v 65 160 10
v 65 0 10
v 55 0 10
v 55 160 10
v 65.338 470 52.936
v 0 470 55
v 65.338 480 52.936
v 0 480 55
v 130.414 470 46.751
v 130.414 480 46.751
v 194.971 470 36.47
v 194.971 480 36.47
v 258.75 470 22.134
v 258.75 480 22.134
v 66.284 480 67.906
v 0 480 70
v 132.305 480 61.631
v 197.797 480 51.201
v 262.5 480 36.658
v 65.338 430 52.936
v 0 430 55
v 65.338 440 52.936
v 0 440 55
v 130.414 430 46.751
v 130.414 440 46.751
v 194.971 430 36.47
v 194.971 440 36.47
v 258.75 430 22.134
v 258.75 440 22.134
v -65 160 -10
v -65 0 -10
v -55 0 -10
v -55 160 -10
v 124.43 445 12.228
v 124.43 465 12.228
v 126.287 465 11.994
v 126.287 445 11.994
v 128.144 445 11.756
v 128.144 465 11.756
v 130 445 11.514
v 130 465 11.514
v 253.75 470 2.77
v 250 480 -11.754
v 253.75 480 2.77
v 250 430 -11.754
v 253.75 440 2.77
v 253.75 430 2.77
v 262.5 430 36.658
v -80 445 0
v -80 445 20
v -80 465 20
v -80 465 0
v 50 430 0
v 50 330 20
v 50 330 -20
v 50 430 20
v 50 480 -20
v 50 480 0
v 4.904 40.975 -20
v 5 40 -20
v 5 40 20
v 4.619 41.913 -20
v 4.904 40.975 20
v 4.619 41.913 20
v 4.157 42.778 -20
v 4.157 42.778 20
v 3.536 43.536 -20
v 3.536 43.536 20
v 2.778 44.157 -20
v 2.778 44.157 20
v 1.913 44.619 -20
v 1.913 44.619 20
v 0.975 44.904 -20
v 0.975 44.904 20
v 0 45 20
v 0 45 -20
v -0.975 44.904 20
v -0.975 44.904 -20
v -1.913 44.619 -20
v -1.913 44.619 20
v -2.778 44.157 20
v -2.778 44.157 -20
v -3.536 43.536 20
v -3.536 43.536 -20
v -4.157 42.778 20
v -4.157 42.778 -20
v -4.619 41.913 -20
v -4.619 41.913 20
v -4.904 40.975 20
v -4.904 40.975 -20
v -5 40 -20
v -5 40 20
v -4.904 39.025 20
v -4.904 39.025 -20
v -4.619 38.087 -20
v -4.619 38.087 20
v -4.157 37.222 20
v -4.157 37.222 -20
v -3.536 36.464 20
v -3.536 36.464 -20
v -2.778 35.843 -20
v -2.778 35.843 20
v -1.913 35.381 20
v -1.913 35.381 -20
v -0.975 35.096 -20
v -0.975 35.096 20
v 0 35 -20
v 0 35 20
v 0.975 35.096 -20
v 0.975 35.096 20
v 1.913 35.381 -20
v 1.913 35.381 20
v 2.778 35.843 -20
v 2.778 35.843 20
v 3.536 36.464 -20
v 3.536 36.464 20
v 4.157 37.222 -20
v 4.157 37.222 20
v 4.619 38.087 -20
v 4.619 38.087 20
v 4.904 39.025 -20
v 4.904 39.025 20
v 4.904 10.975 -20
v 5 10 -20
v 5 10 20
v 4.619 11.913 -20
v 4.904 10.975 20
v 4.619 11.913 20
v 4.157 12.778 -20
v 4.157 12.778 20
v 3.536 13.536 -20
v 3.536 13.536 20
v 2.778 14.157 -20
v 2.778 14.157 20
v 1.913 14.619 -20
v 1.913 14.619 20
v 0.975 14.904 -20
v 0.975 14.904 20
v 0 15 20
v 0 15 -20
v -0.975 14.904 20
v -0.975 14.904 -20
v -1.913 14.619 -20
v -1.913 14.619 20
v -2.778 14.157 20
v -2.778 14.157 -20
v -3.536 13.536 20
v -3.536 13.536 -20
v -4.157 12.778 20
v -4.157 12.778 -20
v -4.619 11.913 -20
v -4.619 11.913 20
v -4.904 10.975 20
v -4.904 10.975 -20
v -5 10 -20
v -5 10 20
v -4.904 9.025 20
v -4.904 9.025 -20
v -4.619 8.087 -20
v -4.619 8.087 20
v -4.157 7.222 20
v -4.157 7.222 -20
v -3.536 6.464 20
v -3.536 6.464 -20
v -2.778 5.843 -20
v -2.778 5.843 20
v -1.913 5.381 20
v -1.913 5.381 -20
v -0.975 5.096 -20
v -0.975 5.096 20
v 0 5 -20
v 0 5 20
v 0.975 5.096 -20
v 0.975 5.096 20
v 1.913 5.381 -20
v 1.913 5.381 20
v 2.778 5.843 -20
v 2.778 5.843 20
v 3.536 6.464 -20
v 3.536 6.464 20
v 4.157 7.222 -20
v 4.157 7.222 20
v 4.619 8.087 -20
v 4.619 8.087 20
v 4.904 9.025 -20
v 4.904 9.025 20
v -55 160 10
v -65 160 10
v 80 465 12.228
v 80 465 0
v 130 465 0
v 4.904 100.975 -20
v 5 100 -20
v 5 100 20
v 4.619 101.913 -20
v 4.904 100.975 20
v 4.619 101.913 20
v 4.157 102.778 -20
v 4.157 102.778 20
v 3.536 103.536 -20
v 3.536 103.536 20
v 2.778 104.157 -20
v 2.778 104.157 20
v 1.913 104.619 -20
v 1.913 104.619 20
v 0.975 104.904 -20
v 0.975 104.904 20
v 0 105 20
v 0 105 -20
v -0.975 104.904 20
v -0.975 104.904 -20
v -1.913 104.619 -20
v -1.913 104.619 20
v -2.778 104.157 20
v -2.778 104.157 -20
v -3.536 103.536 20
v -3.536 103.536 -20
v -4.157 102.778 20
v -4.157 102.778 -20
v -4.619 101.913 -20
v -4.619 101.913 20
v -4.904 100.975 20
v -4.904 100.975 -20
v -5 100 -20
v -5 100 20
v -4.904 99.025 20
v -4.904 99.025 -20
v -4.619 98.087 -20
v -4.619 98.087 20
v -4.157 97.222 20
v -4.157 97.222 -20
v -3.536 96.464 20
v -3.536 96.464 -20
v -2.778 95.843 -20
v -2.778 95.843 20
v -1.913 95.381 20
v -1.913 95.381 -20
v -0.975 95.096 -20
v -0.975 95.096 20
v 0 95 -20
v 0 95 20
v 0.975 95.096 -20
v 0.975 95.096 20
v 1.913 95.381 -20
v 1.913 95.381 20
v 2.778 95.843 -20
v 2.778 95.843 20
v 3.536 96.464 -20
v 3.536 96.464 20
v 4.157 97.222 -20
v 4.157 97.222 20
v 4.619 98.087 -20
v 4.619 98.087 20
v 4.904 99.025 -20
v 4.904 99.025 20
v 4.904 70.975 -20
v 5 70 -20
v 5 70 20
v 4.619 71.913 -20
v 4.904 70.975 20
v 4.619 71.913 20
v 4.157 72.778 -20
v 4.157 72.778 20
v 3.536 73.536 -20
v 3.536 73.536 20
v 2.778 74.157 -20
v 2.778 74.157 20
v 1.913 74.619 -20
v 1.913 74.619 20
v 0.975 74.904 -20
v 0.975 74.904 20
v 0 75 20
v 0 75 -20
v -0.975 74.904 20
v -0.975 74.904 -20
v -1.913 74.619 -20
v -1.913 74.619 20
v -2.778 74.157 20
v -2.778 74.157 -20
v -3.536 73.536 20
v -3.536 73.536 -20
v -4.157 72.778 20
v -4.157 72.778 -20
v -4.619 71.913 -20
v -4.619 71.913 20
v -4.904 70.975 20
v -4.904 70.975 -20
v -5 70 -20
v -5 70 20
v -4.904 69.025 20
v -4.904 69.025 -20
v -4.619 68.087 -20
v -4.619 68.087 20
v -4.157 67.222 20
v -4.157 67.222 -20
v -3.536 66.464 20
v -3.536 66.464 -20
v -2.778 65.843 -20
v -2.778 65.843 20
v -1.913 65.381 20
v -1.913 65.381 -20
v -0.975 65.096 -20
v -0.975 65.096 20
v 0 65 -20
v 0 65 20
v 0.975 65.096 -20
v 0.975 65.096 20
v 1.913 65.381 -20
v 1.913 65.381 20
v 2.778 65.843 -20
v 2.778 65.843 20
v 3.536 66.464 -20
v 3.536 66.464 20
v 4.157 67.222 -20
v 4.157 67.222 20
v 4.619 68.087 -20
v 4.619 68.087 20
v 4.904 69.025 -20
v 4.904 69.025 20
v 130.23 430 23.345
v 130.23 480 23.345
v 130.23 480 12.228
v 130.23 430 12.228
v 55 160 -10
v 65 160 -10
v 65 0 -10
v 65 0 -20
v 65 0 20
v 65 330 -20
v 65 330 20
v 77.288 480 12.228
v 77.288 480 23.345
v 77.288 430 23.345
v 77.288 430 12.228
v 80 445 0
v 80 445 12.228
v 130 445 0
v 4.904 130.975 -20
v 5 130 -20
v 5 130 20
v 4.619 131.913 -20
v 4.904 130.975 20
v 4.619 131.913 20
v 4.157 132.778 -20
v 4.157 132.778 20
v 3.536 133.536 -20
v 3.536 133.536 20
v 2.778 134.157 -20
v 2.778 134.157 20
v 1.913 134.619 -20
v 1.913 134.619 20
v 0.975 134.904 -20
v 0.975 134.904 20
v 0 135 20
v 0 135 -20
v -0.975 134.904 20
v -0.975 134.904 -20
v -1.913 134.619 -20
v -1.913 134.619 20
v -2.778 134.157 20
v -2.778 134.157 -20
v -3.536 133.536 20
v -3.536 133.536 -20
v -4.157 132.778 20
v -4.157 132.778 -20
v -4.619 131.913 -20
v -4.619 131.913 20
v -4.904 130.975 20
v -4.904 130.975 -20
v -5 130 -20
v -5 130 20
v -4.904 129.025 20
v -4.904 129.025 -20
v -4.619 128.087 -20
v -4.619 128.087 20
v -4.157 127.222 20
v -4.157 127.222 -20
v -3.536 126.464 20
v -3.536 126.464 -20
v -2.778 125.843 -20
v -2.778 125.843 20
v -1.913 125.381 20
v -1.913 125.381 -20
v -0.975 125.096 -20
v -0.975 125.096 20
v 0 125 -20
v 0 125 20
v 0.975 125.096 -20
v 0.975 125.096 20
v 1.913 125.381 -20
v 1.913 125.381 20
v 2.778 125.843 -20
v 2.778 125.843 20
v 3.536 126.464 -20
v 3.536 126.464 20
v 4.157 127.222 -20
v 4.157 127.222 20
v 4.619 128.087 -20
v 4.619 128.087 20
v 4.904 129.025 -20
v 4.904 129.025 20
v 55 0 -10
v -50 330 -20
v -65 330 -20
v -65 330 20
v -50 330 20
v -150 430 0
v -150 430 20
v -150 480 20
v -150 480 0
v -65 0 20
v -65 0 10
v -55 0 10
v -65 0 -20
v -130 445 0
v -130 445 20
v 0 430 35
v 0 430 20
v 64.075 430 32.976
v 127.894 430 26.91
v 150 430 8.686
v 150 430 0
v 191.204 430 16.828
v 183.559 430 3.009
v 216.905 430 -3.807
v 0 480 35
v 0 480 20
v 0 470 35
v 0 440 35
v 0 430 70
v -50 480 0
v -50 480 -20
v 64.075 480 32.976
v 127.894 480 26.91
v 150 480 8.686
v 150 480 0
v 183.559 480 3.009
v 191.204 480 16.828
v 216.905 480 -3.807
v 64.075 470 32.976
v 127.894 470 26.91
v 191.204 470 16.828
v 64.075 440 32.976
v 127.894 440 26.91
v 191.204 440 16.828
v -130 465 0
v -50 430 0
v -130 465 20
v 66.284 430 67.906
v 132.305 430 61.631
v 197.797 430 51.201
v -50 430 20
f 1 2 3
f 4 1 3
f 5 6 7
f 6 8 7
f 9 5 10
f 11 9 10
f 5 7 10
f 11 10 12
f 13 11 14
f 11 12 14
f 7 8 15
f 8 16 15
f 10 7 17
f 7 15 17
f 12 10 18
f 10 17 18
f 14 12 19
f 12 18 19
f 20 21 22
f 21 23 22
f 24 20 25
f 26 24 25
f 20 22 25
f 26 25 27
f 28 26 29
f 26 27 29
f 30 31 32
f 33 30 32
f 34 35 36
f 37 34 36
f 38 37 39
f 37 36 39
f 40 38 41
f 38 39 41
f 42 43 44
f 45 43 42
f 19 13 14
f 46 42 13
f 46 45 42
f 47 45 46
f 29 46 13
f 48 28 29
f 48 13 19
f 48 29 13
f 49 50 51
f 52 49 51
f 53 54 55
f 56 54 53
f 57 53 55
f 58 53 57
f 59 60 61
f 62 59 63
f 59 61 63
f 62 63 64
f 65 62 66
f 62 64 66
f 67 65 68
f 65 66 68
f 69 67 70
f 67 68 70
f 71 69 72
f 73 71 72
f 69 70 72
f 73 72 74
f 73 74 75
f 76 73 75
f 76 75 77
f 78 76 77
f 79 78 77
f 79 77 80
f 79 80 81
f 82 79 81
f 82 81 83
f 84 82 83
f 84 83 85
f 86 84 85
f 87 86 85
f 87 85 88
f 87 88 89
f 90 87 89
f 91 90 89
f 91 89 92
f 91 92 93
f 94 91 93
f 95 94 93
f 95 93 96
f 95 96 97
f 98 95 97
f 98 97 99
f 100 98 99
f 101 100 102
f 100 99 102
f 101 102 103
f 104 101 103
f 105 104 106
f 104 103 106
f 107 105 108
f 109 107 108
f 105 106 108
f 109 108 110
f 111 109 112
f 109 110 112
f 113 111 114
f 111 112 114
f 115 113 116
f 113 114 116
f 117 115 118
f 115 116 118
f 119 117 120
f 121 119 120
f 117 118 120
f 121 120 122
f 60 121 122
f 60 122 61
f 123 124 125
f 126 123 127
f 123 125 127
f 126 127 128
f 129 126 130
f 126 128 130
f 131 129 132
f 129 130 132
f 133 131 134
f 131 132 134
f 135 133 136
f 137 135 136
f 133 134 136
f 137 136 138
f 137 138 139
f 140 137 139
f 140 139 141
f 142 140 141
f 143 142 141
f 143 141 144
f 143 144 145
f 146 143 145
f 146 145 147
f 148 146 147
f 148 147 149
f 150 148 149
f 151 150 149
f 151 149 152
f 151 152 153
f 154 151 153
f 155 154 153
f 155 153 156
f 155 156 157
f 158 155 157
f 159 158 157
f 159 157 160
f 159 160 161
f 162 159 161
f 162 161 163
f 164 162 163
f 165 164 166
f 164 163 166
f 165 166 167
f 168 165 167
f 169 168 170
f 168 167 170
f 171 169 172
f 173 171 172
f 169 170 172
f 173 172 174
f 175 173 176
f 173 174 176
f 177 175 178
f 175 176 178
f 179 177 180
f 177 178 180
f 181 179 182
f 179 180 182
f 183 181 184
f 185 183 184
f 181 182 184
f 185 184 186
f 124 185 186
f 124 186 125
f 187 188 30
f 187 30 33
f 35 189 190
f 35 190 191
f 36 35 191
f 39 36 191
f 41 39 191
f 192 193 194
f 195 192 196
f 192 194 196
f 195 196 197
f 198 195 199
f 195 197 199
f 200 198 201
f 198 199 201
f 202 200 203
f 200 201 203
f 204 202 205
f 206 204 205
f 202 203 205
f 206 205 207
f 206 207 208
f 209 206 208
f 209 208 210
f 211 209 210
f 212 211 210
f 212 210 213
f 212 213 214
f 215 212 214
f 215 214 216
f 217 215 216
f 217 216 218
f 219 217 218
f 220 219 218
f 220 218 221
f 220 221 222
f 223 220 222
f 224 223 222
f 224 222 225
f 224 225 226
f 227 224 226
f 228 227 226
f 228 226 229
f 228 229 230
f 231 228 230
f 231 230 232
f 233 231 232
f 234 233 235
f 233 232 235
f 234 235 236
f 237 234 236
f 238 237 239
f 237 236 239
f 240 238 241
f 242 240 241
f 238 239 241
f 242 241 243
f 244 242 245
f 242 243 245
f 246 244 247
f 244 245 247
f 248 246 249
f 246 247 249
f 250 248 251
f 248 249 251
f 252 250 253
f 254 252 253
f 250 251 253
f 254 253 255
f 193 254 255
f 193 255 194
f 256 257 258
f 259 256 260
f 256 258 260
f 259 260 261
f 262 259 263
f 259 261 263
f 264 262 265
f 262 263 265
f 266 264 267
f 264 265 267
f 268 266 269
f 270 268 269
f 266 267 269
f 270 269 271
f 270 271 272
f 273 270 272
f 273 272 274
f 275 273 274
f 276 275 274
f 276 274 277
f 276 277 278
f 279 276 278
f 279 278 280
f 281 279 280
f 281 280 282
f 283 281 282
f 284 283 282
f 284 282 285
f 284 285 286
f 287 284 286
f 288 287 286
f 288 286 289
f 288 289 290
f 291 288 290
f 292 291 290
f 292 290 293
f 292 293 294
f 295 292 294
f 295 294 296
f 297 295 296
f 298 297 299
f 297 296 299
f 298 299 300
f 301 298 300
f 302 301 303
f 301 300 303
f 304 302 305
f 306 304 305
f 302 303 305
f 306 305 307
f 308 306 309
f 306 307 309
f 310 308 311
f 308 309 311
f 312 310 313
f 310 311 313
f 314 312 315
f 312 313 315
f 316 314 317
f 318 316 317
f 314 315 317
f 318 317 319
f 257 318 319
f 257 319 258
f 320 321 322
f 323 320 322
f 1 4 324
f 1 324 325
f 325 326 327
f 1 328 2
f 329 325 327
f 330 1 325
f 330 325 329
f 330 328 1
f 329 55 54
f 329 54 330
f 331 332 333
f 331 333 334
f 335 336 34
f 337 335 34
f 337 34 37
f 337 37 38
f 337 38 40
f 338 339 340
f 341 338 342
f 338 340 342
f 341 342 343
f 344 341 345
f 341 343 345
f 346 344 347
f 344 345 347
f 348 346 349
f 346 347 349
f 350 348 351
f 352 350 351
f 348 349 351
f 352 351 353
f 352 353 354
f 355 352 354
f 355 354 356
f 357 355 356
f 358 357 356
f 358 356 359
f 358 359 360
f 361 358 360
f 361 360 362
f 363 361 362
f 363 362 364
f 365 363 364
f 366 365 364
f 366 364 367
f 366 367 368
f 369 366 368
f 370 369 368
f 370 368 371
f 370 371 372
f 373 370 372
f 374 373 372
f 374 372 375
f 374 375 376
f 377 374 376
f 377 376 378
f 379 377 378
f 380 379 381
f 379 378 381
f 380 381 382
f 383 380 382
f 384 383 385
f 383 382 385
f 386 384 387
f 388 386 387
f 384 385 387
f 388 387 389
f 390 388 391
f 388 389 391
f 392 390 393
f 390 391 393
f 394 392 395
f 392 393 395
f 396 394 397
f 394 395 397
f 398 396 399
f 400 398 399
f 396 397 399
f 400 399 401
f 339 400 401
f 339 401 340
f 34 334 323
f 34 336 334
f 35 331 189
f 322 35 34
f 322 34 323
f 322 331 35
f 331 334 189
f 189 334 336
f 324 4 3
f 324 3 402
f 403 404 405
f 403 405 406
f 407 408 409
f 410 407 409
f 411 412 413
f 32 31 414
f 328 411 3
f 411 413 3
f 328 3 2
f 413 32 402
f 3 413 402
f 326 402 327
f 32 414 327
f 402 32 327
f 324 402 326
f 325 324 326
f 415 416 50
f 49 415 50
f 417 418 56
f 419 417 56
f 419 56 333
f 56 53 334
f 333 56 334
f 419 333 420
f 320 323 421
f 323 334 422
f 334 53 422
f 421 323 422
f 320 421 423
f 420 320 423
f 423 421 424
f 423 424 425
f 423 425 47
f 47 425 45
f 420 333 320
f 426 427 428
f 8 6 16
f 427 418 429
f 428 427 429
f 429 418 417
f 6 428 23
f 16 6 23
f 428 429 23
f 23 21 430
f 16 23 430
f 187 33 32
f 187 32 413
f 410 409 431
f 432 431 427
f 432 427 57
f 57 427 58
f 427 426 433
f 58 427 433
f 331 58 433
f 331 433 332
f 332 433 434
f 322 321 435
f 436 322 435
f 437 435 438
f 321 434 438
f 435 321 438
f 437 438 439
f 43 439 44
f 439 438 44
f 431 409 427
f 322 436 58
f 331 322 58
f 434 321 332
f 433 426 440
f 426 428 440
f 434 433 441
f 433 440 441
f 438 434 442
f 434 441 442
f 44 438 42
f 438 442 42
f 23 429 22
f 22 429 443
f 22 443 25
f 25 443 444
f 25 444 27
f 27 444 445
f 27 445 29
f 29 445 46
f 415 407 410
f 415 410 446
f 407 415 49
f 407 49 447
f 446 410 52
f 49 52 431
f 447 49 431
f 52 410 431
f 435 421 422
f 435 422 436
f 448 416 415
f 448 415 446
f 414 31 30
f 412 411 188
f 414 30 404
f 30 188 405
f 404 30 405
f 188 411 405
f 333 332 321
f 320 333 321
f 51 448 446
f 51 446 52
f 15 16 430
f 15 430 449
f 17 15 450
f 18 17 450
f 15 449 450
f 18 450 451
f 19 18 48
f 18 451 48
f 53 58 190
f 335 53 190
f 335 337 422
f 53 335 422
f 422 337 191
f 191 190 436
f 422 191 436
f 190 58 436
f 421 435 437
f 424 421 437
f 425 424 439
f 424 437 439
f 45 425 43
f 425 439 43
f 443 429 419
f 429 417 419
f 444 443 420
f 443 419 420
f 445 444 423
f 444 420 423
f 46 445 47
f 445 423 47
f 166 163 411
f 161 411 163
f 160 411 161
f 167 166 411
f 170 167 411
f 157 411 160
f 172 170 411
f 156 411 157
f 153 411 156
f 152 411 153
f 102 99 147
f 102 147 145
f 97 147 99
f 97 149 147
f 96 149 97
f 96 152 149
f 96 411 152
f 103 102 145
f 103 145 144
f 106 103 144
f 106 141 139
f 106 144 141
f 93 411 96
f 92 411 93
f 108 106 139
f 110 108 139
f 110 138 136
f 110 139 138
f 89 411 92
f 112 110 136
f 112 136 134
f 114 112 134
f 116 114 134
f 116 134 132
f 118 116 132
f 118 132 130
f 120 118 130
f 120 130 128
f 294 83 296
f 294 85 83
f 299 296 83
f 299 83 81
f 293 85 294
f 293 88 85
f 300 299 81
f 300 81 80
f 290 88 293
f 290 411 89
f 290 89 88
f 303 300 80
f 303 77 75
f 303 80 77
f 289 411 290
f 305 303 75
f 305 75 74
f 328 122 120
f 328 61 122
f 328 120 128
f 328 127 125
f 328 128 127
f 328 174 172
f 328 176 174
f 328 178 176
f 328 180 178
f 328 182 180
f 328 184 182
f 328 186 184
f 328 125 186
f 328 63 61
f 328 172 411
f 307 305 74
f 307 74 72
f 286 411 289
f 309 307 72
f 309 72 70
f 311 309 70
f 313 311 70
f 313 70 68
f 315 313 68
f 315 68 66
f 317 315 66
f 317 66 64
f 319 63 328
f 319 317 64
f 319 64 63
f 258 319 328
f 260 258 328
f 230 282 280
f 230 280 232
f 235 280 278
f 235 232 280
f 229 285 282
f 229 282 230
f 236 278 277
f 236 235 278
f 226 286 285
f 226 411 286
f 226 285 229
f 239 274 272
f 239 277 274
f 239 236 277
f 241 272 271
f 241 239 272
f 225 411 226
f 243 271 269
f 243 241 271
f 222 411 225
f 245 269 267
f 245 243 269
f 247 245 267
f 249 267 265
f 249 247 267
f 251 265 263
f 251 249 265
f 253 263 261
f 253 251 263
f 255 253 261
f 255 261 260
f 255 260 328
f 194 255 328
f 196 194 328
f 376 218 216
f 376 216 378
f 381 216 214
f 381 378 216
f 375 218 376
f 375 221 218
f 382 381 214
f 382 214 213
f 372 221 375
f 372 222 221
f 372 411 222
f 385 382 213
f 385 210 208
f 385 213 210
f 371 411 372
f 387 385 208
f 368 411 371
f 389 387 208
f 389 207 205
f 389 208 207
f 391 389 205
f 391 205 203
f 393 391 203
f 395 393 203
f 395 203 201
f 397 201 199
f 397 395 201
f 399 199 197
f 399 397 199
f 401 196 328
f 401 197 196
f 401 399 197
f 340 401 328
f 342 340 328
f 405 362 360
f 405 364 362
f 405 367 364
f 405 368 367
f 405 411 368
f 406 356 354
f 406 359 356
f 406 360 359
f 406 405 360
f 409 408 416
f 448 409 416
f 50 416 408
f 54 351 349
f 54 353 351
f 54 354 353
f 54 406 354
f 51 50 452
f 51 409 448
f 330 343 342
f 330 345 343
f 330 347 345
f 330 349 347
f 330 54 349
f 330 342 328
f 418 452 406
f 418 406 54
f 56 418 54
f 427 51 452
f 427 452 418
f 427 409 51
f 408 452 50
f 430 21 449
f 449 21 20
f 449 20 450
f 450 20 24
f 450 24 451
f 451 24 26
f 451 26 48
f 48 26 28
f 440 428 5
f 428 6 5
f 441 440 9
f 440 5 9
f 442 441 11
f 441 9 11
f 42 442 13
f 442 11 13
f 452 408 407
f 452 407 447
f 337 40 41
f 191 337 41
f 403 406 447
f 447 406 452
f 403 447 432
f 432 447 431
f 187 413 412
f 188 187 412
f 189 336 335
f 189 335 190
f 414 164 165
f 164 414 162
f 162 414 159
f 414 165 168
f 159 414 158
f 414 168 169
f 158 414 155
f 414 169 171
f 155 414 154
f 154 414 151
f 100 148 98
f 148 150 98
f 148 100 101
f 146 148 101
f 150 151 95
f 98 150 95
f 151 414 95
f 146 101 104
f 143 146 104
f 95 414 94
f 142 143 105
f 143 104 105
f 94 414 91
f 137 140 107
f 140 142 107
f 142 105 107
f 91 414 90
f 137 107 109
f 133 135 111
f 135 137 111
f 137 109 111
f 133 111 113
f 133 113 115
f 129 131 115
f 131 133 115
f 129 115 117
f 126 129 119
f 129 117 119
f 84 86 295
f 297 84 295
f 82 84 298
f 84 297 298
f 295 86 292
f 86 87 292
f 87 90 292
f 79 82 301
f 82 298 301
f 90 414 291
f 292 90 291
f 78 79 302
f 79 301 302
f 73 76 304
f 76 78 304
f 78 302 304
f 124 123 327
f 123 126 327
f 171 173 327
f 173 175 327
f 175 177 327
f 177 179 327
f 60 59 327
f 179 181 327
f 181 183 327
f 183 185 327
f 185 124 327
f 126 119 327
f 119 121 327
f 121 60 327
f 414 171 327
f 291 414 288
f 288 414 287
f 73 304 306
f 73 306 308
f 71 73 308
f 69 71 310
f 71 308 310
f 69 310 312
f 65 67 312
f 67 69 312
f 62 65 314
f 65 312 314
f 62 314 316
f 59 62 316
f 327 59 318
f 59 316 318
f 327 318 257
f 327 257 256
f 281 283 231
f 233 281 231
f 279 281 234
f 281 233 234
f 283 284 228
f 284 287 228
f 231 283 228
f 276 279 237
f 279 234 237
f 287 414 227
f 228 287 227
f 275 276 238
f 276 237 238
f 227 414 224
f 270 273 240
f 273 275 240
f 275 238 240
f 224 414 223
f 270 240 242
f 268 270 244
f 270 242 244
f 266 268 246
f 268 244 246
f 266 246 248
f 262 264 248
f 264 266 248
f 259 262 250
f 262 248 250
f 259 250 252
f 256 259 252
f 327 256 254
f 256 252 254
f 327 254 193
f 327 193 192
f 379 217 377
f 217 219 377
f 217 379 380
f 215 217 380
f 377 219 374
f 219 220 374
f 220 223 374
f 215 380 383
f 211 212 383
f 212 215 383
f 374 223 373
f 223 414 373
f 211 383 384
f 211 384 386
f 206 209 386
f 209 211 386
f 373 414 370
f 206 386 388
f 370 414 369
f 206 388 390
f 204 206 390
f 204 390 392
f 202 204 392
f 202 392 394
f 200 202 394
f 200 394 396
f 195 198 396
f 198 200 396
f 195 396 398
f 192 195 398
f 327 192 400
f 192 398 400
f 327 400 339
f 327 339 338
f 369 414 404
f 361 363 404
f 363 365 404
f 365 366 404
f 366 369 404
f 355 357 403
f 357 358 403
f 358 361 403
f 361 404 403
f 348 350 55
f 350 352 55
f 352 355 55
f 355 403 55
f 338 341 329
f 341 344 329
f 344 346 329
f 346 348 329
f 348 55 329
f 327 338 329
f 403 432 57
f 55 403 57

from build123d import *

# Parameters (mm, degrees)
BODY_DEPTH          = 160
SKETCH2_R           = 5
PIN_HOLE_DEPTH      = 178.270979012
LPATTERN1_COUNT     = 5
LPATTERN1_PITCH     = 30
SKETCH3_W           = 130
SKETCH3_H           = 170
SKETCH3_W_2         = 100
SKETCH3_H_2         = 150
SPINE_DEPTH         = 40
SKETCH10_W          = 300
SKETCH10_H          = 50
SKETCH10_W_2        = 50
SKETCH10_H_2        = 20
BOSS_EXTRUDE5_DEPTH = 20
CUT_EXTRUDE2_REACH  = 553.549
SKETCH11_W          = 52.942098854
SKETCH11_H          = 11.117065858


with BuildPart() as part:
    # Sketch1 → body (new body)
    with BuildSketch(Plane(origin=(0, 0, 0), x_dir=(1, 0, 0), z_dir=(0, 1, 0))):
        Polygon((65, 20), (-65, 20), (-65, 10), (-55, 10), (-55, -10), (-65, -10), (-65, -20), (65, -20), (65, -10), (55, -10), (55, 10), (65, 10), align=None)
    extrude(amount=BODY_DEPTH)

    # Sketch2 → pin hole (cut, through all)
    with BuildSketch(Plane.XY.offset(20)):
        with Locations((0, 10)):
            Circle(SKETCH2_R)
    pin_hole = extrude(amount=-PIN_HOLE_DEPTH, mode=Mode.SUBTRACT)

    # LPattern1: pin hole ×5
    with Locations(*[(0, i * LPATTERN1_PITCH, 0) for i in range(1, LPATTERN1_COUNT)]):
        add(pin_hole, mode=Mode.SUBTRACT)

    # Sketch3 → spine (add)
    with BuildSketch(Plane.XY.offset(20)):
        with Locations((0, 245)):
            Rectangle(SKETCH3_W, SKETCH3_H)
        with Locations((0, 405)):
            Rectangle(SKETCH3_W_2, SKETCH3_H_2)
    extrude(amount=-SPINE_DEPTH)

    # Sweep4: sweep along a path in Sketch8
    with BuildLine(Plane(origin=(0, 480, 0), x_dir=(1, 0, 0), z_dir=(0, 1, 0))) as sweep4_path:
        ThreePointArc((0, -20), (126.004292483, -12.029696267), (250, 11.754163448))
    # Sketch6<6> → Sweep4 (sweep)
    with BuildSketch(Plane(origin=(0, 0, 0), x_dir=(0, 0, -1), z_dir=(1, 0, 0))):
        Polygon((-70, 480), (-55, 480), (-55, 470), (-35, 470), (-35, 480), (-20, 480), (-20, 430), (-35, 430), (-35, 440), (-55, 440), (-55, 430), (-70, 430), align=None)
    sweep(path=sweep4_path.line)

    # Sketch10 → Boss-Extrude5 (add)
    with BuildSketch(Plane.XY.offset(20)):
        with Locations((0, 455)):
            Rectangle(SKETCH10_W, SKETCH10_H)
        with Locations((-105, 455)):
            Rectangle(SKETCH10_W_2, SKETCH10_H_2, mode=Mode.SUBTRACT)
        with Locations((105, 455)):
            Rectangle(SKETCH10_W_2, SKETCH10_H_2, mode=Mode.SUBTRACT)
    extrude(amount=-BOSS_EXTRUDE5_DEPTH)

    # Sketch11 → Cut-Extrude2 (cut, up to next)
    with BuildSketch(Plane(origin=(0, 480, 0), x_dir=(1, 0, 0), z_dir=(0, 1, 0)), mode=Mode.PRIVATE) as cut_extrude2_sk1:
        with Locations((103.759397545, -17.786929586)):
            Rectangle(SKETCH11_W, SKETCH11_H)
    cut_extrude2_tool1 = extrude(cut_extrude2_sk1.sketch, amount=-CUT_EXTRUDE2_REACH, mode=Mode.PRIVATE) & part.part
    add(cut_extrude2_tool1.solids().sort_by_distance((103.759398, 480, 17.78693))[0], mode=Mode.SUBTRACT)


solid = part.part
